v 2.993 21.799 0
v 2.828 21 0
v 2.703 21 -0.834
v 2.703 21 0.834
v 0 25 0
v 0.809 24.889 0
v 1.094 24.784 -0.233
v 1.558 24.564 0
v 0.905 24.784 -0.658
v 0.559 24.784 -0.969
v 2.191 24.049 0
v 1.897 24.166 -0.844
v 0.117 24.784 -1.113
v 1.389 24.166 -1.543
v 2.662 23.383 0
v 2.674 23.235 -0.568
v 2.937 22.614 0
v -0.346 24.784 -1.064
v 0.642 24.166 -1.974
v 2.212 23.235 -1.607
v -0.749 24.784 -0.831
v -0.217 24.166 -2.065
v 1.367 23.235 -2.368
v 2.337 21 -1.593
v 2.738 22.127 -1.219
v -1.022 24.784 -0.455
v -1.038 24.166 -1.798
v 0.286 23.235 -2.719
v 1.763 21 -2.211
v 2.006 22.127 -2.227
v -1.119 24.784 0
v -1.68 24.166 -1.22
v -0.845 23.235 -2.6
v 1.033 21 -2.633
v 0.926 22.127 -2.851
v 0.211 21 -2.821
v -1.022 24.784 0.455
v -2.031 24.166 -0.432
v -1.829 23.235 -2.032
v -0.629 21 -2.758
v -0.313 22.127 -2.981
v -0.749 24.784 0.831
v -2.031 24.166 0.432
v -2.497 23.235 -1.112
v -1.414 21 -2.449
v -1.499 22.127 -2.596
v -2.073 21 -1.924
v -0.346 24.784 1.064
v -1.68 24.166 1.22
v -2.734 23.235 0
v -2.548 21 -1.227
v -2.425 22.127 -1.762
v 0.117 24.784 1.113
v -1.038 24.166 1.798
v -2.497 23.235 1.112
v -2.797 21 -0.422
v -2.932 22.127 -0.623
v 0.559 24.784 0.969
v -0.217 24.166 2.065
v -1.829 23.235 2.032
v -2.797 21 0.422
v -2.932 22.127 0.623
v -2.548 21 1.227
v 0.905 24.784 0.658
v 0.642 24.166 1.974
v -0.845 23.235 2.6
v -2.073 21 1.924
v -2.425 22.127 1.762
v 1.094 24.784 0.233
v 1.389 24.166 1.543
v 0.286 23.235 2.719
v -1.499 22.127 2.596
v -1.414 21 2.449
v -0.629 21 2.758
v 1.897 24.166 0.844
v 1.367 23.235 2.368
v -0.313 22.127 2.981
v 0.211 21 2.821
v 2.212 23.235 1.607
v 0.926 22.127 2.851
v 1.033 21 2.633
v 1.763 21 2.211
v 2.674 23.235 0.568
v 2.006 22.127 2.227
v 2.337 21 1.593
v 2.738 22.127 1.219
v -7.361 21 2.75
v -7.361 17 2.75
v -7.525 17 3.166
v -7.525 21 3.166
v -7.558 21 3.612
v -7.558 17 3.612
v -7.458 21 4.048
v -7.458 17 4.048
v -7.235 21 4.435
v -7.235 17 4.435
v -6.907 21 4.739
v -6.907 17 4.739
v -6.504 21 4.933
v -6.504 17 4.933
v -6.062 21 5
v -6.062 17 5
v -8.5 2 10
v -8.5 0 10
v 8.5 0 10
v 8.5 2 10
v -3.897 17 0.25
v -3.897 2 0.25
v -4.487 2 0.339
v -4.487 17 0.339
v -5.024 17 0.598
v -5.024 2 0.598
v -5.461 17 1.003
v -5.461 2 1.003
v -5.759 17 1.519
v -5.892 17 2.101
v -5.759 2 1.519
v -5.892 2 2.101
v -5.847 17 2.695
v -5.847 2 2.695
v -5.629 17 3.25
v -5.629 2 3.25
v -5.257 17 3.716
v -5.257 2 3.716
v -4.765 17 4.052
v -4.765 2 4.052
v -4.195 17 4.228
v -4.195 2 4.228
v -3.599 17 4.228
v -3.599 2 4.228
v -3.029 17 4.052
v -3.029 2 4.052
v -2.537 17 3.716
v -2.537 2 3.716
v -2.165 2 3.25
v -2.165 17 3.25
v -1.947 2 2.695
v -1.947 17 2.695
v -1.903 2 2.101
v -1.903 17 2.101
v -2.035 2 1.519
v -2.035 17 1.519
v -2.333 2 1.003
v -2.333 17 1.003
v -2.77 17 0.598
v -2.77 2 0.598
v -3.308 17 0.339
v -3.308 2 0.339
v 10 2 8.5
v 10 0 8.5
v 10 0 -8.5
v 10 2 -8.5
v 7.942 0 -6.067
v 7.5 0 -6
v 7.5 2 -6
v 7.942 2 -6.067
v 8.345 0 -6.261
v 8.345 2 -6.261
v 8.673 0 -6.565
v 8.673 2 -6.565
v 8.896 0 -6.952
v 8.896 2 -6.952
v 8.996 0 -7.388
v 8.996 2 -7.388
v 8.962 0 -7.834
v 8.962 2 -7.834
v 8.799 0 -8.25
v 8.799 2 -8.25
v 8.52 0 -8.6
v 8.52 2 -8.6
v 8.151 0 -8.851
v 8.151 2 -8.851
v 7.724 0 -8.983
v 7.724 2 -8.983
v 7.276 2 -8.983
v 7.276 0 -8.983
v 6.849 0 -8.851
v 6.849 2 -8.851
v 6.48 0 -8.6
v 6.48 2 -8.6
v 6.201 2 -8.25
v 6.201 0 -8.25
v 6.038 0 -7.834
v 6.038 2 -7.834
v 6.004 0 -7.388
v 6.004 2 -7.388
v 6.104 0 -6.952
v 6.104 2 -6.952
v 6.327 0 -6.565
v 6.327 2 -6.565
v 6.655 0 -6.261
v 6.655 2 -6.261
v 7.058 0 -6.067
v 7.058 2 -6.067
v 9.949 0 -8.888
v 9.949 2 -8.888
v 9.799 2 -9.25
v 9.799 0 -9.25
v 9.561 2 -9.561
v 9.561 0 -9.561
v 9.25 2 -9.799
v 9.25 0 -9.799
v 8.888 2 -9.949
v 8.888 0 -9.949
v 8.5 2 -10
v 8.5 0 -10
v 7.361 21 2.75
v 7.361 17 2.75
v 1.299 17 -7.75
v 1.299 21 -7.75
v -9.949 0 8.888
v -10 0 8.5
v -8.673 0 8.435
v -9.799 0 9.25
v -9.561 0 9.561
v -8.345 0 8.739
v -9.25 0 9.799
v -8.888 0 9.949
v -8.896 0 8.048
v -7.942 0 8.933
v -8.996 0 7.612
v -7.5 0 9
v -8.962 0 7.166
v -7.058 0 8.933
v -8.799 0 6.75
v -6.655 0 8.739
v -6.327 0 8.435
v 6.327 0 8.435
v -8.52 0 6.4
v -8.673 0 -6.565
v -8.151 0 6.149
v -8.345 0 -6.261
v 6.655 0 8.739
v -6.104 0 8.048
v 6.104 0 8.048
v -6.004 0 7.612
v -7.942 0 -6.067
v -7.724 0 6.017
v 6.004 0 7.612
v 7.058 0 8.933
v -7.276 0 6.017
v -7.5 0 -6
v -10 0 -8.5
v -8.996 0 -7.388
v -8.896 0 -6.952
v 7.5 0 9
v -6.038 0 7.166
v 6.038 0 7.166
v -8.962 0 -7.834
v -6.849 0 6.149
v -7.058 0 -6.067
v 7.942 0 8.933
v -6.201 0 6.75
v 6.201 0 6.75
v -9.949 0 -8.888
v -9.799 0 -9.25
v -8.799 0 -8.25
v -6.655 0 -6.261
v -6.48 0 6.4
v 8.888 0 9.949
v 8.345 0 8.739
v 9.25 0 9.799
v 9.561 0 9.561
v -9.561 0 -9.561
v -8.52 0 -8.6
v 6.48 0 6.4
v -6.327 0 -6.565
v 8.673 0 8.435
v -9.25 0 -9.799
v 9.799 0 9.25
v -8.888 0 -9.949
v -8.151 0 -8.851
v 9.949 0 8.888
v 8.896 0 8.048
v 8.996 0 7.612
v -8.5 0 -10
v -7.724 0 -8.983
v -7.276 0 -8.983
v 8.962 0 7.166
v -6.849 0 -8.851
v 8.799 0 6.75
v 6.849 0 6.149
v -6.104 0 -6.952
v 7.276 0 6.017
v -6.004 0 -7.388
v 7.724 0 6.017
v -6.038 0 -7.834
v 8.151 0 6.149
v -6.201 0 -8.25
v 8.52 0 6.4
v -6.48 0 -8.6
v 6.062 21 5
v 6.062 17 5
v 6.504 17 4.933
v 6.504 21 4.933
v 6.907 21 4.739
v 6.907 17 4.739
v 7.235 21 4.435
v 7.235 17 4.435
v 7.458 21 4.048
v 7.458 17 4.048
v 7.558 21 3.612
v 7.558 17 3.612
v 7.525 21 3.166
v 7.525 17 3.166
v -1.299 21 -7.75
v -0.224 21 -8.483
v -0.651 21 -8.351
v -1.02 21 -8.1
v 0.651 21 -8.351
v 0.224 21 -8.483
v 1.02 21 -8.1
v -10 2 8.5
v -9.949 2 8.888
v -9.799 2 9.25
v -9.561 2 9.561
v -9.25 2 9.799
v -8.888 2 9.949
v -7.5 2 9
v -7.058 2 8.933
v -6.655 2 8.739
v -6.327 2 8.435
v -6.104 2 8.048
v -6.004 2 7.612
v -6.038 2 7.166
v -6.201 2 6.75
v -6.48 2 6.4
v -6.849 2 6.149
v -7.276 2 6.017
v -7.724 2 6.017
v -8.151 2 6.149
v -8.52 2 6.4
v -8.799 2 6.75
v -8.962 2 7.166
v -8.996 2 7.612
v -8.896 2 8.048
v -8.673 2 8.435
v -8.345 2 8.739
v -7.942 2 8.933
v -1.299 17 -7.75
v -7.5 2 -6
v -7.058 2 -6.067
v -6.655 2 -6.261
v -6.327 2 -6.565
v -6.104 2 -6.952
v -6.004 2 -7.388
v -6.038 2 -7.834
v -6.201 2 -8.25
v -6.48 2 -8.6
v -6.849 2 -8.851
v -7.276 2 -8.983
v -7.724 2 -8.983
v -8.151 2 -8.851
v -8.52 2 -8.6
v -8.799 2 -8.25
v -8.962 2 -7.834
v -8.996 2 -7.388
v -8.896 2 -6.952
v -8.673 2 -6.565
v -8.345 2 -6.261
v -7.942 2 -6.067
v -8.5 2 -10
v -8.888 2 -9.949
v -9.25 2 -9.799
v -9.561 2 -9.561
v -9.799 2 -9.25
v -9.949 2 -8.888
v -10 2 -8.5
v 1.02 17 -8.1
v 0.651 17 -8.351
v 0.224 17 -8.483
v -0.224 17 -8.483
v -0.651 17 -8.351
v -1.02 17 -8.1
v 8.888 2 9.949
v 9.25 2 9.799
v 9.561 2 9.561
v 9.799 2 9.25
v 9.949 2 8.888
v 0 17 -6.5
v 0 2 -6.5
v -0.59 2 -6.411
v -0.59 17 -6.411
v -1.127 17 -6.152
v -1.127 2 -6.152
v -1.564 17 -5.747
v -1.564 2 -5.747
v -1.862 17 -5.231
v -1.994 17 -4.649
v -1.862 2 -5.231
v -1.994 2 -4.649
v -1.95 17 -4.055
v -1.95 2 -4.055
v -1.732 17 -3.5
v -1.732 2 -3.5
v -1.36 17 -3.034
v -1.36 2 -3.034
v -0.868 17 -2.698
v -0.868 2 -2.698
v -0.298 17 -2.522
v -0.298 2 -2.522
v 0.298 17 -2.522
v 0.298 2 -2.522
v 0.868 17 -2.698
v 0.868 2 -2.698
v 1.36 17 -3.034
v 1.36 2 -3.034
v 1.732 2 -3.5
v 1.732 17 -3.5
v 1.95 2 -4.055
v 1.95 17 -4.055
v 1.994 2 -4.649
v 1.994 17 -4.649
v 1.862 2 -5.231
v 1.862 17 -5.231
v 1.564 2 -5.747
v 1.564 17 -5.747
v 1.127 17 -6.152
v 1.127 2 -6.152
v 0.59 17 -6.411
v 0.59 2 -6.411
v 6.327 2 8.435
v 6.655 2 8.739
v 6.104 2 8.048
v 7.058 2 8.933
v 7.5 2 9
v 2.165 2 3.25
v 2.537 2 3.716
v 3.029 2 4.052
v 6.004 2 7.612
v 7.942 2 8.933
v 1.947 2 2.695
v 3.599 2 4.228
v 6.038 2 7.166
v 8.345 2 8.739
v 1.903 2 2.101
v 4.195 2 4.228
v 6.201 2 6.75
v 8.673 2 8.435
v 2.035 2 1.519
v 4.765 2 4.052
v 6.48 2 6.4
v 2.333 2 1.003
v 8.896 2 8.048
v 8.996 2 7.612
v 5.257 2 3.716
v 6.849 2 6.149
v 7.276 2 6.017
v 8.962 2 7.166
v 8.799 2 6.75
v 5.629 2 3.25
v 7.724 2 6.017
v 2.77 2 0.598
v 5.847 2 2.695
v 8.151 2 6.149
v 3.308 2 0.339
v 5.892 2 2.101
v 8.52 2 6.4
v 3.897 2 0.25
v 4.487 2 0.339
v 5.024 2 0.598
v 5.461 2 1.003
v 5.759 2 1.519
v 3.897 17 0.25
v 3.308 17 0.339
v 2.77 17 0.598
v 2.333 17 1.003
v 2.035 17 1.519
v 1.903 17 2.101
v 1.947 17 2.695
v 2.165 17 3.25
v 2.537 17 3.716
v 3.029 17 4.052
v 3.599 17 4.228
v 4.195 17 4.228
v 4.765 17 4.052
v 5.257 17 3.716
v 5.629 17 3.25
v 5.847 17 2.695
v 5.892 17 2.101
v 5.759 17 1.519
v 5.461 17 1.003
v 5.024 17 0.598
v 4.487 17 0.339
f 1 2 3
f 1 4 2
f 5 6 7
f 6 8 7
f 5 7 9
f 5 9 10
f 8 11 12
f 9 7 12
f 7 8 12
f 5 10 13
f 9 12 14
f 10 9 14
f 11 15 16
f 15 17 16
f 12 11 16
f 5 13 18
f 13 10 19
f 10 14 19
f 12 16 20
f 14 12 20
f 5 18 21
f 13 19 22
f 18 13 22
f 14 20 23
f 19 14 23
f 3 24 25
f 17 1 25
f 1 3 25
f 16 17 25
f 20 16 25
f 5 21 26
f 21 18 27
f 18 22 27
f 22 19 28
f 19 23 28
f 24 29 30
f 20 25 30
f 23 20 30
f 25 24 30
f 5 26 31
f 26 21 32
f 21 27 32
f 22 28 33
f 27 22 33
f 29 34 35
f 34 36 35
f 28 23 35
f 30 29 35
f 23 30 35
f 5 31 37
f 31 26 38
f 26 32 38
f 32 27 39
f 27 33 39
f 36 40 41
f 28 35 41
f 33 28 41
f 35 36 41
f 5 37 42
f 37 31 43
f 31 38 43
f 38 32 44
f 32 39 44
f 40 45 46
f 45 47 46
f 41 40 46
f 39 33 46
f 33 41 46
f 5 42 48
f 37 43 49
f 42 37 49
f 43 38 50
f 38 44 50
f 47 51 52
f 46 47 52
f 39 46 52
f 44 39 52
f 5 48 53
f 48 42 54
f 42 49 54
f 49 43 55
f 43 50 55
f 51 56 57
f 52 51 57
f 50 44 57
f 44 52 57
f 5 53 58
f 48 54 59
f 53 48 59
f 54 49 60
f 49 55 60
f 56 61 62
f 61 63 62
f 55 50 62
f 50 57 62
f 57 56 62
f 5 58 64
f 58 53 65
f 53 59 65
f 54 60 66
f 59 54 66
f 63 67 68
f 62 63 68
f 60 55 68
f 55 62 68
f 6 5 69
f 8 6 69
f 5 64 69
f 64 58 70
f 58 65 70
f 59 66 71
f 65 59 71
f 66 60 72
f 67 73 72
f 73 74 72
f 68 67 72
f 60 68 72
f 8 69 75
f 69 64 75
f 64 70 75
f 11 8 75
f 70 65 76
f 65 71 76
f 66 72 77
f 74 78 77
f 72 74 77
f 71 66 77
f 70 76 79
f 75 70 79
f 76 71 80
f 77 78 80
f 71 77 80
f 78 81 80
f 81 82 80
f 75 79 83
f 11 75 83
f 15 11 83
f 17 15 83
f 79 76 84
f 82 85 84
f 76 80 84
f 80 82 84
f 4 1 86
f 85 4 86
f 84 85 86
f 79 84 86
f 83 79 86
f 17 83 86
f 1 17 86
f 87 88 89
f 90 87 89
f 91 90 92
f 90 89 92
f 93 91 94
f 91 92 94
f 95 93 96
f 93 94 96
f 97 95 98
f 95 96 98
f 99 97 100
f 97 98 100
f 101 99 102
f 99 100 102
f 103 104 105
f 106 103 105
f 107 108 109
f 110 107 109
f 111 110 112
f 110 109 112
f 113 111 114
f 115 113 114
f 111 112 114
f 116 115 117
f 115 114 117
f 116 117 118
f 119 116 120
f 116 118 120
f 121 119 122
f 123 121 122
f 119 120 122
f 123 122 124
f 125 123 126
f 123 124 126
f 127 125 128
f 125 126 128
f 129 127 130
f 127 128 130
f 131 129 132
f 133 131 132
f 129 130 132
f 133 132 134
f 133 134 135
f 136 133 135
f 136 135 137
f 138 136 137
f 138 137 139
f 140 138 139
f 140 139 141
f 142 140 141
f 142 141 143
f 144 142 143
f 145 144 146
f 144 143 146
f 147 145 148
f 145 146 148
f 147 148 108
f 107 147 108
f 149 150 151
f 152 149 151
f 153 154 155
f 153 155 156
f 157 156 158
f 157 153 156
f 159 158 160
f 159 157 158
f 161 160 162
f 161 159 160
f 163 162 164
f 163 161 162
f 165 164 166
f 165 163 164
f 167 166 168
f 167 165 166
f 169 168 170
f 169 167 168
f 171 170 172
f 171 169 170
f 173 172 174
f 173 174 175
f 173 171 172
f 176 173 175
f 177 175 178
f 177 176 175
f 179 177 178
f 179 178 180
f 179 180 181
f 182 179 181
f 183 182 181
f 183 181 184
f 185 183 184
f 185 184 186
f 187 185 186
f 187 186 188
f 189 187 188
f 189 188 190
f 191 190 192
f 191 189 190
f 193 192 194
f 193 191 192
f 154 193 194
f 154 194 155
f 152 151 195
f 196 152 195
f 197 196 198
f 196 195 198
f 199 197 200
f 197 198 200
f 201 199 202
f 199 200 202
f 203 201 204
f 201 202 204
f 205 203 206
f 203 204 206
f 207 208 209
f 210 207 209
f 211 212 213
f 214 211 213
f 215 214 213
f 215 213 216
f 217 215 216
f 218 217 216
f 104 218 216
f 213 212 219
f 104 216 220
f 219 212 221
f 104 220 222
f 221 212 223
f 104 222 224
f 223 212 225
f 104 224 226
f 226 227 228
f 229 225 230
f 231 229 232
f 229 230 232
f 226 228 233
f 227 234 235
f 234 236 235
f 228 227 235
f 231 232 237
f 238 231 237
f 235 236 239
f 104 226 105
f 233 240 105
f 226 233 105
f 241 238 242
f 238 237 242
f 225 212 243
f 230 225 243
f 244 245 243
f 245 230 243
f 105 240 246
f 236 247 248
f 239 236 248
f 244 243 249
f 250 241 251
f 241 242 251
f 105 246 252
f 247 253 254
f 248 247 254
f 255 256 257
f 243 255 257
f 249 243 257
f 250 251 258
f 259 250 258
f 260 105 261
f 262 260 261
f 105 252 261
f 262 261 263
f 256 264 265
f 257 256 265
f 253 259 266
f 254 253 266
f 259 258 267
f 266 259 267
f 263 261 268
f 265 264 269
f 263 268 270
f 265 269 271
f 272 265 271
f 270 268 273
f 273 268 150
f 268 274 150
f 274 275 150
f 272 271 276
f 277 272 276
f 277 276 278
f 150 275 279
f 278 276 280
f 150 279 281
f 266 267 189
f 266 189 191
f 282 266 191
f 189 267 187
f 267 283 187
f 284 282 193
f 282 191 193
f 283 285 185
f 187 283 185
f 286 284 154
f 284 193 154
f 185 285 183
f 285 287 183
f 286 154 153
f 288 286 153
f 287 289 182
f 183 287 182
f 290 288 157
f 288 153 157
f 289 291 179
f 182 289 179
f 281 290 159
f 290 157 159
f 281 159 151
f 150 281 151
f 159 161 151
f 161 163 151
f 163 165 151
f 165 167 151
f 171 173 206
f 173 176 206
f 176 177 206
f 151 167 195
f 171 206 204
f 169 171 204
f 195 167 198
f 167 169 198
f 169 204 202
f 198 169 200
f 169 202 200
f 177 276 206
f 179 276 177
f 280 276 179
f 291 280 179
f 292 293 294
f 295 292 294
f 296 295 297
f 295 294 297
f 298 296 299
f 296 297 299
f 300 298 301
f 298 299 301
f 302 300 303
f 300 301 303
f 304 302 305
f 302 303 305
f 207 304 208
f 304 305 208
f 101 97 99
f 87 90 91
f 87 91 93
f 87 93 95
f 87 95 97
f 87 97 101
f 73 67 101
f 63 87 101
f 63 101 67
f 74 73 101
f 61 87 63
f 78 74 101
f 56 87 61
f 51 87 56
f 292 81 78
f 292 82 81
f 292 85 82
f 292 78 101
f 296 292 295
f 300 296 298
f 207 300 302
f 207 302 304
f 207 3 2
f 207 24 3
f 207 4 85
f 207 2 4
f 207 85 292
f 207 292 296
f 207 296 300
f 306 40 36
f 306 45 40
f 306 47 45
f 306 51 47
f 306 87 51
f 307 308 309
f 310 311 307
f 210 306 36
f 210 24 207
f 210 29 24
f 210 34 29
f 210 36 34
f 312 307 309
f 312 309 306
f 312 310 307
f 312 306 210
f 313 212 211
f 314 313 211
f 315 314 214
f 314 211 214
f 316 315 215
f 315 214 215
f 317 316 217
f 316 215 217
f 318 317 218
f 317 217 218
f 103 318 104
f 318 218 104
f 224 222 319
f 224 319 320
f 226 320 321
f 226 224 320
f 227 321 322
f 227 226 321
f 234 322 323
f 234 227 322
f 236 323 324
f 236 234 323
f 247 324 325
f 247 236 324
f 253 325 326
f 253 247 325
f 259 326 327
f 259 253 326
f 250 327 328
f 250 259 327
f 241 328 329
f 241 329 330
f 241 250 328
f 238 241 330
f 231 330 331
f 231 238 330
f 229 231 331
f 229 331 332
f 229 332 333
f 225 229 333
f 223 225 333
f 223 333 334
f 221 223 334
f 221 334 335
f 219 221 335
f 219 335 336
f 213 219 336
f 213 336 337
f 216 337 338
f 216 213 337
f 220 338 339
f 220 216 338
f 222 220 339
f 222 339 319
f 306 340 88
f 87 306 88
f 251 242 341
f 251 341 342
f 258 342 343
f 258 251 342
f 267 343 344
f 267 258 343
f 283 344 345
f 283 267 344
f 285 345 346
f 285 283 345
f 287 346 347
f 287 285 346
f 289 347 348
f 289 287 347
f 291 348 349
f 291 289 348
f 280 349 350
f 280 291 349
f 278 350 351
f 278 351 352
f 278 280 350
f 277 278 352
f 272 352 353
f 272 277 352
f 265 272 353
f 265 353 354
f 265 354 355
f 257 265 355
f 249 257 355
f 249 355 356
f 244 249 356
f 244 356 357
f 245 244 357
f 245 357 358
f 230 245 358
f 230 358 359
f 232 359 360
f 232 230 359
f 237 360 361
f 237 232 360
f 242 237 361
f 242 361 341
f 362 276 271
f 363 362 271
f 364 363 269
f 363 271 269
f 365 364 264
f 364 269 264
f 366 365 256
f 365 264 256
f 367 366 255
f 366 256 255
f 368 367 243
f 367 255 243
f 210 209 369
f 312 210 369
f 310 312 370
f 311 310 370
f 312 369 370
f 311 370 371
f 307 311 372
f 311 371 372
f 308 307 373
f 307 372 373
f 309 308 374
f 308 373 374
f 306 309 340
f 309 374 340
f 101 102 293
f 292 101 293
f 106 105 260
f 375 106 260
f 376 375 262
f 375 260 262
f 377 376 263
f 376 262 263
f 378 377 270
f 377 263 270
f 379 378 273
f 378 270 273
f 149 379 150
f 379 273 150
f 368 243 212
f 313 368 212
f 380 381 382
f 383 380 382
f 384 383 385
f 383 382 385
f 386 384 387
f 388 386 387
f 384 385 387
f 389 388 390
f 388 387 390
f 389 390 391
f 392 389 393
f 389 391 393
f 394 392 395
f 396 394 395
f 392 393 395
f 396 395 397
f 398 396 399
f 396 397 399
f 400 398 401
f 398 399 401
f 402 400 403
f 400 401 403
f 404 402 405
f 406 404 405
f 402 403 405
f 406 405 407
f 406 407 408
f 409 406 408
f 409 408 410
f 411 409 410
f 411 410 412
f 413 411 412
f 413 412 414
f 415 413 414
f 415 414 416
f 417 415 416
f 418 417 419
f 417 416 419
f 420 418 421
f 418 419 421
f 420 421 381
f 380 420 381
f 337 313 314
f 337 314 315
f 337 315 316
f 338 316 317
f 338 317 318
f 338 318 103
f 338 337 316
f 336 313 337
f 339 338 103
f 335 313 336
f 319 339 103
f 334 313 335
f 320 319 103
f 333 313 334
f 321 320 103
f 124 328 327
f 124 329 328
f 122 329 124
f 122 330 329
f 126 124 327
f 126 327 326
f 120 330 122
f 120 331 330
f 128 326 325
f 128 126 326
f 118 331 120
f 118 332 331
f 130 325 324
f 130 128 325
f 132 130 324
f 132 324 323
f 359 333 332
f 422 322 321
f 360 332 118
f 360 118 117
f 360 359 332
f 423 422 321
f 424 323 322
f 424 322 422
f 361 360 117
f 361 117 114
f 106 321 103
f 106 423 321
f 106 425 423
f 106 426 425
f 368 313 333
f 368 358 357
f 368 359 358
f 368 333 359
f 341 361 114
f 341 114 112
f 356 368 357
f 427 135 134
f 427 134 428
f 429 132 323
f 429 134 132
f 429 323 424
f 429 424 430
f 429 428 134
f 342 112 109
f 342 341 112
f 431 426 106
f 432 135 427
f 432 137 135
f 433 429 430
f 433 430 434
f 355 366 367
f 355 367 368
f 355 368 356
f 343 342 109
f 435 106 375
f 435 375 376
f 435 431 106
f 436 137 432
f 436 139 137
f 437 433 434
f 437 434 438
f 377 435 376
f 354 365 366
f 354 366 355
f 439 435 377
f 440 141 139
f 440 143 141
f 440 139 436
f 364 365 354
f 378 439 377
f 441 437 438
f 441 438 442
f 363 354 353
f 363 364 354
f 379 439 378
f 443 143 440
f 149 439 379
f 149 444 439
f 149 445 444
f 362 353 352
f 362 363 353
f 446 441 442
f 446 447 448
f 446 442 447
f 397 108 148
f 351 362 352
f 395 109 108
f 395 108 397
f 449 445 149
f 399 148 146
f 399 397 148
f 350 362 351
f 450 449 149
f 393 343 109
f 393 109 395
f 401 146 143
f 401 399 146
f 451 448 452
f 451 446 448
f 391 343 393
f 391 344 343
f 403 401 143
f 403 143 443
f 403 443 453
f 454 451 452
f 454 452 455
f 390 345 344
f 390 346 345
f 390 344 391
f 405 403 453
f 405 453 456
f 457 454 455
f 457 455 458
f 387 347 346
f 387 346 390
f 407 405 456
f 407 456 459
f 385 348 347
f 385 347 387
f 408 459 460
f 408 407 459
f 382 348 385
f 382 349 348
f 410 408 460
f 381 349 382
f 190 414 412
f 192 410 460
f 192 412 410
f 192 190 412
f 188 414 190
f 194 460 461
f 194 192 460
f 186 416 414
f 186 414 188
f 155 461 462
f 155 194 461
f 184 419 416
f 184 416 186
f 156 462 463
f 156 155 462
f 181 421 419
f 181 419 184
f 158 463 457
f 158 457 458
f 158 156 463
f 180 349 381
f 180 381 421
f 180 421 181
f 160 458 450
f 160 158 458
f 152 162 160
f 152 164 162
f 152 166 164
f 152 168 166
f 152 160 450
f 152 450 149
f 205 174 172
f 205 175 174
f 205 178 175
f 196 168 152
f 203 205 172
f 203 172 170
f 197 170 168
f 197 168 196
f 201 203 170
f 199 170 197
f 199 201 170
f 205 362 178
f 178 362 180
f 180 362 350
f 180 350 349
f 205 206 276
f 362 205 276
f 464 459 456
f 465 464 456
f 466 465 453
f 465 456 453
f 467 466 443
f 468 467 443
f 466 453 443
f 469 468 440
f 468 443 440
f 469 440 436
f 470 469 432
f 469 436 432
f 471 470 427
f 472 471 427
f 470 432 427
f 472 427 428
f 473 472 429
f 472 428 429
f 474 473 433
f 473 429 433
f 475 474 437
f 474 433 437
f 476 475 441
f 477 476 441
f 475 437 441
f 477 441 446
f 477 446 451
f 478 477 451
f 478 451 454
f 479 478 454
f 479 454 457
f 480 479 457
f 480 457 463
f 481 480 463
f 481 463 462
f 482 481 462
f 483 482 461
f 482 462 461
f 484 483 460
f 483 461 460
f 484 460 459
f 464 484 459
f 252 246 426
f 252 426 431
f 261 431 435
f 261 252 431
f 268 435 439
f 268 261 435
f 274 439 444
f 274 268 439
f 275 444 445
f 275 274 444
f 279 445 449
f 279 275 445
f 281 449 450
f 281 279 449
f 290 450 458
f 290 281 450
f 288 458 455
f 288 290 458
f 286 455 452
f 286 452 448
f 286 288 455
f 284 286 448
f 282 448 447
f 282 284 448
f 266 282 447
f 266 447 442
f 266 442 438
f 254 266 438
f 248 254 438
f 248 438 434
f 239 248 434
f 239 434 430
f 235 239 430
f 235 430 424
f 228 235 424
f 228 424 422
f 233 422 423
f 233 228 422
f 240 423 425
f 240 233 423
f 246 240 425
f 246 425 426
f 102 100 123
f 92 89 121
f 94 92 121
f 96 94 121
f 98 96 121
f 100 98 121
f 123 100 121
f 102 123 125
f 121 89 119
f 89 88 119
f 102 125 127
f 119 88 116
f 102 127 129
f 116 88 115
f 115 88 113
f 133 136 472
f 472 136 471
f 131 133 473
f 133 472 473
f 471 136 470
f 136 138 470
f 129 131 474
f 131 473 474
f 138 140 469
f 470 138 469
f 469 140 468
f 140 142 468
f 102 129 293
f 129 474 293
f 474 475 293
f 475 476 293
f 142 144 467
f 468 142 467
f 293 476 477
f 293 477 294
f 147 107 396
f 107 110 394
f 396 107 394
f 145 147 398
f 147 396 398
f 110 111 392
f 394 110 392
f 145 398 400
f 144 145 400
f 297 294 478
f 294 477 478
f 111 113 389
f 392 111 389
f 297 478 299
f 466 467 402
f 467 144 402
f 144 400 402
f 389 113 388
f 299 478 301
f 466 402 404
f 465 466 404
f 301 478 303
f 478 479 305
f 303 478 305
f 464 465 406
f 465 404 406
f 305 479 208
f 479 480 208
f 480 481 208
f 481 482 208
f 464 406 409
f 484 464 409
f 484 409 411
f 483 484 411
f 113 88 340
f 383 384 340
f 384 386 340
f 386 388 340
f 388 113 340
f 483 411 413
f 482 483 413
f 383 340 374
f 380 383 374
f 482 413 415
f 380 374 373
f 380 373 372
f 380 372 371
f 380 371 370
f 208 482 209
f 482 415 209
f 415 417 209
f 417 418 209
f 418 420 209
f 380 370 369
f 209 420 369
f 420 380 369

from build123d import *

# Parameters (mm, degrees)
SKETCH_1_R      = 1.5
EXTRUDE_1_DEPTH = 2
SKETCH_2_R      = 2
EXTRUDE_2_DEPTH = 15
EXTRUDE_3_DEPTH = 4


with BuildPart() as part:
    # 草图1 → 凸台-拉伸1 (new body)
    with BuildSketch(Plane(origin=(0, 0, 0), x_dir=(1, 0, 0), z_dir=(0, 1, 0))):
        with BuildLine():
            Line((-8.5, -10), (8.5, -10))
            ThreePointArc((8.5, -10), (9.560660172, -9.560660172), (10, -8.5))
            Line((10, -8.5), (10, 8.5))
            ThreePointArc((10, 8.5), (9.560660172, 9.560660172), (8.5, 10))
            Line((8.5, 10), (-8.5, 10))
            ThreePointArc((-8.5, 10), (-9.560660172, 9.560660172), (-10, 8.5))
            Line((-10, 8.5), (-10, -8.5))
            ThreePointArc((-10, -8.5), (-9.560660172, -9.560660172), (-8.5, -10))
        make_face()
        with Locations((7.5, 7.5)):
            Circle(SKETCH_1_R, mode=Mode.SUBTRACT)
        with Locations((-7.5, 7.5)):
            Circle(SKETCH_1_R, mode=Mode.SUBTRACT)
        with Locations((-7.5, -7.5)):
            Circle(SKETCH_1_R, mode=Mode.SUBTRACT)
        with Locations((7.5, -7.5)):
            Circle(SKETCH_1_R, mode=Mode.SUBTRACT)
    extrude(amount=EXTRUDE_1_DEPTH)

    # 草图2 → 凸台-拉伸2 (add)
    with BuildSketch(Plane(origin=(0, 2, 0), x_dir=(1, 0, 0), z_dir=(0, 1, 0))):
        with Locations((0, 4.5)):
            Circle(SKETCH_2_R)
        with Locations((3.897114317, -2.25)):
            Circle(SKETCH_2_R)
        with Locations((-3.897114317, -2.25)):
            Circle(SKETCH_2_R)
    extrude(amount=EXTRUDE_2_DEPTH)

    # 草图4 → 凸台-拉伸3 (add)
    with BuildSketch(Plane(origin=(0, 17, 0), x_dir=(1, 0, 0), z_dir=(0, 1, 0))):
        with BuildLine():
            Line((-1.299038106, 7.75), (-7.361215932, -2.75))
            ThreePointArc((-7.361215932, -2.75), (-7.361215932, -4.25), (-6.062177826, -5))
            Line((-6.062177826, -5), (6.062177826, -5))
            ThreePointArc((6.062177826, -5), (7.361215932, -4.25), (7.361215932, -2.75))
            Line((7.361215932, -2.75), (1.299038106, 7.75))
            ThreePointArc((1.299038106, 7.75), (0, 8.5), (-1.299038106, 7.75))
        make_face()
    extrude(amount=EXTRUDE_3_DEPTH)

    # 草图7 → 旋转4 (revolve)
    with BuildSketch(Plane.XY):
        with BuildLine():
            Line((0, 25), (0, 19))
            ThreePointArc((0, 19), (2.121320344, 19.878679656), (3, 22))
            ThreePointArc((3, 22), (2.121320344, 24.121320344), (0, 25))
        make_face()
    revolve(axis=Axis((0, 19, 0), (0, 1, 0)))


solid = part.part
